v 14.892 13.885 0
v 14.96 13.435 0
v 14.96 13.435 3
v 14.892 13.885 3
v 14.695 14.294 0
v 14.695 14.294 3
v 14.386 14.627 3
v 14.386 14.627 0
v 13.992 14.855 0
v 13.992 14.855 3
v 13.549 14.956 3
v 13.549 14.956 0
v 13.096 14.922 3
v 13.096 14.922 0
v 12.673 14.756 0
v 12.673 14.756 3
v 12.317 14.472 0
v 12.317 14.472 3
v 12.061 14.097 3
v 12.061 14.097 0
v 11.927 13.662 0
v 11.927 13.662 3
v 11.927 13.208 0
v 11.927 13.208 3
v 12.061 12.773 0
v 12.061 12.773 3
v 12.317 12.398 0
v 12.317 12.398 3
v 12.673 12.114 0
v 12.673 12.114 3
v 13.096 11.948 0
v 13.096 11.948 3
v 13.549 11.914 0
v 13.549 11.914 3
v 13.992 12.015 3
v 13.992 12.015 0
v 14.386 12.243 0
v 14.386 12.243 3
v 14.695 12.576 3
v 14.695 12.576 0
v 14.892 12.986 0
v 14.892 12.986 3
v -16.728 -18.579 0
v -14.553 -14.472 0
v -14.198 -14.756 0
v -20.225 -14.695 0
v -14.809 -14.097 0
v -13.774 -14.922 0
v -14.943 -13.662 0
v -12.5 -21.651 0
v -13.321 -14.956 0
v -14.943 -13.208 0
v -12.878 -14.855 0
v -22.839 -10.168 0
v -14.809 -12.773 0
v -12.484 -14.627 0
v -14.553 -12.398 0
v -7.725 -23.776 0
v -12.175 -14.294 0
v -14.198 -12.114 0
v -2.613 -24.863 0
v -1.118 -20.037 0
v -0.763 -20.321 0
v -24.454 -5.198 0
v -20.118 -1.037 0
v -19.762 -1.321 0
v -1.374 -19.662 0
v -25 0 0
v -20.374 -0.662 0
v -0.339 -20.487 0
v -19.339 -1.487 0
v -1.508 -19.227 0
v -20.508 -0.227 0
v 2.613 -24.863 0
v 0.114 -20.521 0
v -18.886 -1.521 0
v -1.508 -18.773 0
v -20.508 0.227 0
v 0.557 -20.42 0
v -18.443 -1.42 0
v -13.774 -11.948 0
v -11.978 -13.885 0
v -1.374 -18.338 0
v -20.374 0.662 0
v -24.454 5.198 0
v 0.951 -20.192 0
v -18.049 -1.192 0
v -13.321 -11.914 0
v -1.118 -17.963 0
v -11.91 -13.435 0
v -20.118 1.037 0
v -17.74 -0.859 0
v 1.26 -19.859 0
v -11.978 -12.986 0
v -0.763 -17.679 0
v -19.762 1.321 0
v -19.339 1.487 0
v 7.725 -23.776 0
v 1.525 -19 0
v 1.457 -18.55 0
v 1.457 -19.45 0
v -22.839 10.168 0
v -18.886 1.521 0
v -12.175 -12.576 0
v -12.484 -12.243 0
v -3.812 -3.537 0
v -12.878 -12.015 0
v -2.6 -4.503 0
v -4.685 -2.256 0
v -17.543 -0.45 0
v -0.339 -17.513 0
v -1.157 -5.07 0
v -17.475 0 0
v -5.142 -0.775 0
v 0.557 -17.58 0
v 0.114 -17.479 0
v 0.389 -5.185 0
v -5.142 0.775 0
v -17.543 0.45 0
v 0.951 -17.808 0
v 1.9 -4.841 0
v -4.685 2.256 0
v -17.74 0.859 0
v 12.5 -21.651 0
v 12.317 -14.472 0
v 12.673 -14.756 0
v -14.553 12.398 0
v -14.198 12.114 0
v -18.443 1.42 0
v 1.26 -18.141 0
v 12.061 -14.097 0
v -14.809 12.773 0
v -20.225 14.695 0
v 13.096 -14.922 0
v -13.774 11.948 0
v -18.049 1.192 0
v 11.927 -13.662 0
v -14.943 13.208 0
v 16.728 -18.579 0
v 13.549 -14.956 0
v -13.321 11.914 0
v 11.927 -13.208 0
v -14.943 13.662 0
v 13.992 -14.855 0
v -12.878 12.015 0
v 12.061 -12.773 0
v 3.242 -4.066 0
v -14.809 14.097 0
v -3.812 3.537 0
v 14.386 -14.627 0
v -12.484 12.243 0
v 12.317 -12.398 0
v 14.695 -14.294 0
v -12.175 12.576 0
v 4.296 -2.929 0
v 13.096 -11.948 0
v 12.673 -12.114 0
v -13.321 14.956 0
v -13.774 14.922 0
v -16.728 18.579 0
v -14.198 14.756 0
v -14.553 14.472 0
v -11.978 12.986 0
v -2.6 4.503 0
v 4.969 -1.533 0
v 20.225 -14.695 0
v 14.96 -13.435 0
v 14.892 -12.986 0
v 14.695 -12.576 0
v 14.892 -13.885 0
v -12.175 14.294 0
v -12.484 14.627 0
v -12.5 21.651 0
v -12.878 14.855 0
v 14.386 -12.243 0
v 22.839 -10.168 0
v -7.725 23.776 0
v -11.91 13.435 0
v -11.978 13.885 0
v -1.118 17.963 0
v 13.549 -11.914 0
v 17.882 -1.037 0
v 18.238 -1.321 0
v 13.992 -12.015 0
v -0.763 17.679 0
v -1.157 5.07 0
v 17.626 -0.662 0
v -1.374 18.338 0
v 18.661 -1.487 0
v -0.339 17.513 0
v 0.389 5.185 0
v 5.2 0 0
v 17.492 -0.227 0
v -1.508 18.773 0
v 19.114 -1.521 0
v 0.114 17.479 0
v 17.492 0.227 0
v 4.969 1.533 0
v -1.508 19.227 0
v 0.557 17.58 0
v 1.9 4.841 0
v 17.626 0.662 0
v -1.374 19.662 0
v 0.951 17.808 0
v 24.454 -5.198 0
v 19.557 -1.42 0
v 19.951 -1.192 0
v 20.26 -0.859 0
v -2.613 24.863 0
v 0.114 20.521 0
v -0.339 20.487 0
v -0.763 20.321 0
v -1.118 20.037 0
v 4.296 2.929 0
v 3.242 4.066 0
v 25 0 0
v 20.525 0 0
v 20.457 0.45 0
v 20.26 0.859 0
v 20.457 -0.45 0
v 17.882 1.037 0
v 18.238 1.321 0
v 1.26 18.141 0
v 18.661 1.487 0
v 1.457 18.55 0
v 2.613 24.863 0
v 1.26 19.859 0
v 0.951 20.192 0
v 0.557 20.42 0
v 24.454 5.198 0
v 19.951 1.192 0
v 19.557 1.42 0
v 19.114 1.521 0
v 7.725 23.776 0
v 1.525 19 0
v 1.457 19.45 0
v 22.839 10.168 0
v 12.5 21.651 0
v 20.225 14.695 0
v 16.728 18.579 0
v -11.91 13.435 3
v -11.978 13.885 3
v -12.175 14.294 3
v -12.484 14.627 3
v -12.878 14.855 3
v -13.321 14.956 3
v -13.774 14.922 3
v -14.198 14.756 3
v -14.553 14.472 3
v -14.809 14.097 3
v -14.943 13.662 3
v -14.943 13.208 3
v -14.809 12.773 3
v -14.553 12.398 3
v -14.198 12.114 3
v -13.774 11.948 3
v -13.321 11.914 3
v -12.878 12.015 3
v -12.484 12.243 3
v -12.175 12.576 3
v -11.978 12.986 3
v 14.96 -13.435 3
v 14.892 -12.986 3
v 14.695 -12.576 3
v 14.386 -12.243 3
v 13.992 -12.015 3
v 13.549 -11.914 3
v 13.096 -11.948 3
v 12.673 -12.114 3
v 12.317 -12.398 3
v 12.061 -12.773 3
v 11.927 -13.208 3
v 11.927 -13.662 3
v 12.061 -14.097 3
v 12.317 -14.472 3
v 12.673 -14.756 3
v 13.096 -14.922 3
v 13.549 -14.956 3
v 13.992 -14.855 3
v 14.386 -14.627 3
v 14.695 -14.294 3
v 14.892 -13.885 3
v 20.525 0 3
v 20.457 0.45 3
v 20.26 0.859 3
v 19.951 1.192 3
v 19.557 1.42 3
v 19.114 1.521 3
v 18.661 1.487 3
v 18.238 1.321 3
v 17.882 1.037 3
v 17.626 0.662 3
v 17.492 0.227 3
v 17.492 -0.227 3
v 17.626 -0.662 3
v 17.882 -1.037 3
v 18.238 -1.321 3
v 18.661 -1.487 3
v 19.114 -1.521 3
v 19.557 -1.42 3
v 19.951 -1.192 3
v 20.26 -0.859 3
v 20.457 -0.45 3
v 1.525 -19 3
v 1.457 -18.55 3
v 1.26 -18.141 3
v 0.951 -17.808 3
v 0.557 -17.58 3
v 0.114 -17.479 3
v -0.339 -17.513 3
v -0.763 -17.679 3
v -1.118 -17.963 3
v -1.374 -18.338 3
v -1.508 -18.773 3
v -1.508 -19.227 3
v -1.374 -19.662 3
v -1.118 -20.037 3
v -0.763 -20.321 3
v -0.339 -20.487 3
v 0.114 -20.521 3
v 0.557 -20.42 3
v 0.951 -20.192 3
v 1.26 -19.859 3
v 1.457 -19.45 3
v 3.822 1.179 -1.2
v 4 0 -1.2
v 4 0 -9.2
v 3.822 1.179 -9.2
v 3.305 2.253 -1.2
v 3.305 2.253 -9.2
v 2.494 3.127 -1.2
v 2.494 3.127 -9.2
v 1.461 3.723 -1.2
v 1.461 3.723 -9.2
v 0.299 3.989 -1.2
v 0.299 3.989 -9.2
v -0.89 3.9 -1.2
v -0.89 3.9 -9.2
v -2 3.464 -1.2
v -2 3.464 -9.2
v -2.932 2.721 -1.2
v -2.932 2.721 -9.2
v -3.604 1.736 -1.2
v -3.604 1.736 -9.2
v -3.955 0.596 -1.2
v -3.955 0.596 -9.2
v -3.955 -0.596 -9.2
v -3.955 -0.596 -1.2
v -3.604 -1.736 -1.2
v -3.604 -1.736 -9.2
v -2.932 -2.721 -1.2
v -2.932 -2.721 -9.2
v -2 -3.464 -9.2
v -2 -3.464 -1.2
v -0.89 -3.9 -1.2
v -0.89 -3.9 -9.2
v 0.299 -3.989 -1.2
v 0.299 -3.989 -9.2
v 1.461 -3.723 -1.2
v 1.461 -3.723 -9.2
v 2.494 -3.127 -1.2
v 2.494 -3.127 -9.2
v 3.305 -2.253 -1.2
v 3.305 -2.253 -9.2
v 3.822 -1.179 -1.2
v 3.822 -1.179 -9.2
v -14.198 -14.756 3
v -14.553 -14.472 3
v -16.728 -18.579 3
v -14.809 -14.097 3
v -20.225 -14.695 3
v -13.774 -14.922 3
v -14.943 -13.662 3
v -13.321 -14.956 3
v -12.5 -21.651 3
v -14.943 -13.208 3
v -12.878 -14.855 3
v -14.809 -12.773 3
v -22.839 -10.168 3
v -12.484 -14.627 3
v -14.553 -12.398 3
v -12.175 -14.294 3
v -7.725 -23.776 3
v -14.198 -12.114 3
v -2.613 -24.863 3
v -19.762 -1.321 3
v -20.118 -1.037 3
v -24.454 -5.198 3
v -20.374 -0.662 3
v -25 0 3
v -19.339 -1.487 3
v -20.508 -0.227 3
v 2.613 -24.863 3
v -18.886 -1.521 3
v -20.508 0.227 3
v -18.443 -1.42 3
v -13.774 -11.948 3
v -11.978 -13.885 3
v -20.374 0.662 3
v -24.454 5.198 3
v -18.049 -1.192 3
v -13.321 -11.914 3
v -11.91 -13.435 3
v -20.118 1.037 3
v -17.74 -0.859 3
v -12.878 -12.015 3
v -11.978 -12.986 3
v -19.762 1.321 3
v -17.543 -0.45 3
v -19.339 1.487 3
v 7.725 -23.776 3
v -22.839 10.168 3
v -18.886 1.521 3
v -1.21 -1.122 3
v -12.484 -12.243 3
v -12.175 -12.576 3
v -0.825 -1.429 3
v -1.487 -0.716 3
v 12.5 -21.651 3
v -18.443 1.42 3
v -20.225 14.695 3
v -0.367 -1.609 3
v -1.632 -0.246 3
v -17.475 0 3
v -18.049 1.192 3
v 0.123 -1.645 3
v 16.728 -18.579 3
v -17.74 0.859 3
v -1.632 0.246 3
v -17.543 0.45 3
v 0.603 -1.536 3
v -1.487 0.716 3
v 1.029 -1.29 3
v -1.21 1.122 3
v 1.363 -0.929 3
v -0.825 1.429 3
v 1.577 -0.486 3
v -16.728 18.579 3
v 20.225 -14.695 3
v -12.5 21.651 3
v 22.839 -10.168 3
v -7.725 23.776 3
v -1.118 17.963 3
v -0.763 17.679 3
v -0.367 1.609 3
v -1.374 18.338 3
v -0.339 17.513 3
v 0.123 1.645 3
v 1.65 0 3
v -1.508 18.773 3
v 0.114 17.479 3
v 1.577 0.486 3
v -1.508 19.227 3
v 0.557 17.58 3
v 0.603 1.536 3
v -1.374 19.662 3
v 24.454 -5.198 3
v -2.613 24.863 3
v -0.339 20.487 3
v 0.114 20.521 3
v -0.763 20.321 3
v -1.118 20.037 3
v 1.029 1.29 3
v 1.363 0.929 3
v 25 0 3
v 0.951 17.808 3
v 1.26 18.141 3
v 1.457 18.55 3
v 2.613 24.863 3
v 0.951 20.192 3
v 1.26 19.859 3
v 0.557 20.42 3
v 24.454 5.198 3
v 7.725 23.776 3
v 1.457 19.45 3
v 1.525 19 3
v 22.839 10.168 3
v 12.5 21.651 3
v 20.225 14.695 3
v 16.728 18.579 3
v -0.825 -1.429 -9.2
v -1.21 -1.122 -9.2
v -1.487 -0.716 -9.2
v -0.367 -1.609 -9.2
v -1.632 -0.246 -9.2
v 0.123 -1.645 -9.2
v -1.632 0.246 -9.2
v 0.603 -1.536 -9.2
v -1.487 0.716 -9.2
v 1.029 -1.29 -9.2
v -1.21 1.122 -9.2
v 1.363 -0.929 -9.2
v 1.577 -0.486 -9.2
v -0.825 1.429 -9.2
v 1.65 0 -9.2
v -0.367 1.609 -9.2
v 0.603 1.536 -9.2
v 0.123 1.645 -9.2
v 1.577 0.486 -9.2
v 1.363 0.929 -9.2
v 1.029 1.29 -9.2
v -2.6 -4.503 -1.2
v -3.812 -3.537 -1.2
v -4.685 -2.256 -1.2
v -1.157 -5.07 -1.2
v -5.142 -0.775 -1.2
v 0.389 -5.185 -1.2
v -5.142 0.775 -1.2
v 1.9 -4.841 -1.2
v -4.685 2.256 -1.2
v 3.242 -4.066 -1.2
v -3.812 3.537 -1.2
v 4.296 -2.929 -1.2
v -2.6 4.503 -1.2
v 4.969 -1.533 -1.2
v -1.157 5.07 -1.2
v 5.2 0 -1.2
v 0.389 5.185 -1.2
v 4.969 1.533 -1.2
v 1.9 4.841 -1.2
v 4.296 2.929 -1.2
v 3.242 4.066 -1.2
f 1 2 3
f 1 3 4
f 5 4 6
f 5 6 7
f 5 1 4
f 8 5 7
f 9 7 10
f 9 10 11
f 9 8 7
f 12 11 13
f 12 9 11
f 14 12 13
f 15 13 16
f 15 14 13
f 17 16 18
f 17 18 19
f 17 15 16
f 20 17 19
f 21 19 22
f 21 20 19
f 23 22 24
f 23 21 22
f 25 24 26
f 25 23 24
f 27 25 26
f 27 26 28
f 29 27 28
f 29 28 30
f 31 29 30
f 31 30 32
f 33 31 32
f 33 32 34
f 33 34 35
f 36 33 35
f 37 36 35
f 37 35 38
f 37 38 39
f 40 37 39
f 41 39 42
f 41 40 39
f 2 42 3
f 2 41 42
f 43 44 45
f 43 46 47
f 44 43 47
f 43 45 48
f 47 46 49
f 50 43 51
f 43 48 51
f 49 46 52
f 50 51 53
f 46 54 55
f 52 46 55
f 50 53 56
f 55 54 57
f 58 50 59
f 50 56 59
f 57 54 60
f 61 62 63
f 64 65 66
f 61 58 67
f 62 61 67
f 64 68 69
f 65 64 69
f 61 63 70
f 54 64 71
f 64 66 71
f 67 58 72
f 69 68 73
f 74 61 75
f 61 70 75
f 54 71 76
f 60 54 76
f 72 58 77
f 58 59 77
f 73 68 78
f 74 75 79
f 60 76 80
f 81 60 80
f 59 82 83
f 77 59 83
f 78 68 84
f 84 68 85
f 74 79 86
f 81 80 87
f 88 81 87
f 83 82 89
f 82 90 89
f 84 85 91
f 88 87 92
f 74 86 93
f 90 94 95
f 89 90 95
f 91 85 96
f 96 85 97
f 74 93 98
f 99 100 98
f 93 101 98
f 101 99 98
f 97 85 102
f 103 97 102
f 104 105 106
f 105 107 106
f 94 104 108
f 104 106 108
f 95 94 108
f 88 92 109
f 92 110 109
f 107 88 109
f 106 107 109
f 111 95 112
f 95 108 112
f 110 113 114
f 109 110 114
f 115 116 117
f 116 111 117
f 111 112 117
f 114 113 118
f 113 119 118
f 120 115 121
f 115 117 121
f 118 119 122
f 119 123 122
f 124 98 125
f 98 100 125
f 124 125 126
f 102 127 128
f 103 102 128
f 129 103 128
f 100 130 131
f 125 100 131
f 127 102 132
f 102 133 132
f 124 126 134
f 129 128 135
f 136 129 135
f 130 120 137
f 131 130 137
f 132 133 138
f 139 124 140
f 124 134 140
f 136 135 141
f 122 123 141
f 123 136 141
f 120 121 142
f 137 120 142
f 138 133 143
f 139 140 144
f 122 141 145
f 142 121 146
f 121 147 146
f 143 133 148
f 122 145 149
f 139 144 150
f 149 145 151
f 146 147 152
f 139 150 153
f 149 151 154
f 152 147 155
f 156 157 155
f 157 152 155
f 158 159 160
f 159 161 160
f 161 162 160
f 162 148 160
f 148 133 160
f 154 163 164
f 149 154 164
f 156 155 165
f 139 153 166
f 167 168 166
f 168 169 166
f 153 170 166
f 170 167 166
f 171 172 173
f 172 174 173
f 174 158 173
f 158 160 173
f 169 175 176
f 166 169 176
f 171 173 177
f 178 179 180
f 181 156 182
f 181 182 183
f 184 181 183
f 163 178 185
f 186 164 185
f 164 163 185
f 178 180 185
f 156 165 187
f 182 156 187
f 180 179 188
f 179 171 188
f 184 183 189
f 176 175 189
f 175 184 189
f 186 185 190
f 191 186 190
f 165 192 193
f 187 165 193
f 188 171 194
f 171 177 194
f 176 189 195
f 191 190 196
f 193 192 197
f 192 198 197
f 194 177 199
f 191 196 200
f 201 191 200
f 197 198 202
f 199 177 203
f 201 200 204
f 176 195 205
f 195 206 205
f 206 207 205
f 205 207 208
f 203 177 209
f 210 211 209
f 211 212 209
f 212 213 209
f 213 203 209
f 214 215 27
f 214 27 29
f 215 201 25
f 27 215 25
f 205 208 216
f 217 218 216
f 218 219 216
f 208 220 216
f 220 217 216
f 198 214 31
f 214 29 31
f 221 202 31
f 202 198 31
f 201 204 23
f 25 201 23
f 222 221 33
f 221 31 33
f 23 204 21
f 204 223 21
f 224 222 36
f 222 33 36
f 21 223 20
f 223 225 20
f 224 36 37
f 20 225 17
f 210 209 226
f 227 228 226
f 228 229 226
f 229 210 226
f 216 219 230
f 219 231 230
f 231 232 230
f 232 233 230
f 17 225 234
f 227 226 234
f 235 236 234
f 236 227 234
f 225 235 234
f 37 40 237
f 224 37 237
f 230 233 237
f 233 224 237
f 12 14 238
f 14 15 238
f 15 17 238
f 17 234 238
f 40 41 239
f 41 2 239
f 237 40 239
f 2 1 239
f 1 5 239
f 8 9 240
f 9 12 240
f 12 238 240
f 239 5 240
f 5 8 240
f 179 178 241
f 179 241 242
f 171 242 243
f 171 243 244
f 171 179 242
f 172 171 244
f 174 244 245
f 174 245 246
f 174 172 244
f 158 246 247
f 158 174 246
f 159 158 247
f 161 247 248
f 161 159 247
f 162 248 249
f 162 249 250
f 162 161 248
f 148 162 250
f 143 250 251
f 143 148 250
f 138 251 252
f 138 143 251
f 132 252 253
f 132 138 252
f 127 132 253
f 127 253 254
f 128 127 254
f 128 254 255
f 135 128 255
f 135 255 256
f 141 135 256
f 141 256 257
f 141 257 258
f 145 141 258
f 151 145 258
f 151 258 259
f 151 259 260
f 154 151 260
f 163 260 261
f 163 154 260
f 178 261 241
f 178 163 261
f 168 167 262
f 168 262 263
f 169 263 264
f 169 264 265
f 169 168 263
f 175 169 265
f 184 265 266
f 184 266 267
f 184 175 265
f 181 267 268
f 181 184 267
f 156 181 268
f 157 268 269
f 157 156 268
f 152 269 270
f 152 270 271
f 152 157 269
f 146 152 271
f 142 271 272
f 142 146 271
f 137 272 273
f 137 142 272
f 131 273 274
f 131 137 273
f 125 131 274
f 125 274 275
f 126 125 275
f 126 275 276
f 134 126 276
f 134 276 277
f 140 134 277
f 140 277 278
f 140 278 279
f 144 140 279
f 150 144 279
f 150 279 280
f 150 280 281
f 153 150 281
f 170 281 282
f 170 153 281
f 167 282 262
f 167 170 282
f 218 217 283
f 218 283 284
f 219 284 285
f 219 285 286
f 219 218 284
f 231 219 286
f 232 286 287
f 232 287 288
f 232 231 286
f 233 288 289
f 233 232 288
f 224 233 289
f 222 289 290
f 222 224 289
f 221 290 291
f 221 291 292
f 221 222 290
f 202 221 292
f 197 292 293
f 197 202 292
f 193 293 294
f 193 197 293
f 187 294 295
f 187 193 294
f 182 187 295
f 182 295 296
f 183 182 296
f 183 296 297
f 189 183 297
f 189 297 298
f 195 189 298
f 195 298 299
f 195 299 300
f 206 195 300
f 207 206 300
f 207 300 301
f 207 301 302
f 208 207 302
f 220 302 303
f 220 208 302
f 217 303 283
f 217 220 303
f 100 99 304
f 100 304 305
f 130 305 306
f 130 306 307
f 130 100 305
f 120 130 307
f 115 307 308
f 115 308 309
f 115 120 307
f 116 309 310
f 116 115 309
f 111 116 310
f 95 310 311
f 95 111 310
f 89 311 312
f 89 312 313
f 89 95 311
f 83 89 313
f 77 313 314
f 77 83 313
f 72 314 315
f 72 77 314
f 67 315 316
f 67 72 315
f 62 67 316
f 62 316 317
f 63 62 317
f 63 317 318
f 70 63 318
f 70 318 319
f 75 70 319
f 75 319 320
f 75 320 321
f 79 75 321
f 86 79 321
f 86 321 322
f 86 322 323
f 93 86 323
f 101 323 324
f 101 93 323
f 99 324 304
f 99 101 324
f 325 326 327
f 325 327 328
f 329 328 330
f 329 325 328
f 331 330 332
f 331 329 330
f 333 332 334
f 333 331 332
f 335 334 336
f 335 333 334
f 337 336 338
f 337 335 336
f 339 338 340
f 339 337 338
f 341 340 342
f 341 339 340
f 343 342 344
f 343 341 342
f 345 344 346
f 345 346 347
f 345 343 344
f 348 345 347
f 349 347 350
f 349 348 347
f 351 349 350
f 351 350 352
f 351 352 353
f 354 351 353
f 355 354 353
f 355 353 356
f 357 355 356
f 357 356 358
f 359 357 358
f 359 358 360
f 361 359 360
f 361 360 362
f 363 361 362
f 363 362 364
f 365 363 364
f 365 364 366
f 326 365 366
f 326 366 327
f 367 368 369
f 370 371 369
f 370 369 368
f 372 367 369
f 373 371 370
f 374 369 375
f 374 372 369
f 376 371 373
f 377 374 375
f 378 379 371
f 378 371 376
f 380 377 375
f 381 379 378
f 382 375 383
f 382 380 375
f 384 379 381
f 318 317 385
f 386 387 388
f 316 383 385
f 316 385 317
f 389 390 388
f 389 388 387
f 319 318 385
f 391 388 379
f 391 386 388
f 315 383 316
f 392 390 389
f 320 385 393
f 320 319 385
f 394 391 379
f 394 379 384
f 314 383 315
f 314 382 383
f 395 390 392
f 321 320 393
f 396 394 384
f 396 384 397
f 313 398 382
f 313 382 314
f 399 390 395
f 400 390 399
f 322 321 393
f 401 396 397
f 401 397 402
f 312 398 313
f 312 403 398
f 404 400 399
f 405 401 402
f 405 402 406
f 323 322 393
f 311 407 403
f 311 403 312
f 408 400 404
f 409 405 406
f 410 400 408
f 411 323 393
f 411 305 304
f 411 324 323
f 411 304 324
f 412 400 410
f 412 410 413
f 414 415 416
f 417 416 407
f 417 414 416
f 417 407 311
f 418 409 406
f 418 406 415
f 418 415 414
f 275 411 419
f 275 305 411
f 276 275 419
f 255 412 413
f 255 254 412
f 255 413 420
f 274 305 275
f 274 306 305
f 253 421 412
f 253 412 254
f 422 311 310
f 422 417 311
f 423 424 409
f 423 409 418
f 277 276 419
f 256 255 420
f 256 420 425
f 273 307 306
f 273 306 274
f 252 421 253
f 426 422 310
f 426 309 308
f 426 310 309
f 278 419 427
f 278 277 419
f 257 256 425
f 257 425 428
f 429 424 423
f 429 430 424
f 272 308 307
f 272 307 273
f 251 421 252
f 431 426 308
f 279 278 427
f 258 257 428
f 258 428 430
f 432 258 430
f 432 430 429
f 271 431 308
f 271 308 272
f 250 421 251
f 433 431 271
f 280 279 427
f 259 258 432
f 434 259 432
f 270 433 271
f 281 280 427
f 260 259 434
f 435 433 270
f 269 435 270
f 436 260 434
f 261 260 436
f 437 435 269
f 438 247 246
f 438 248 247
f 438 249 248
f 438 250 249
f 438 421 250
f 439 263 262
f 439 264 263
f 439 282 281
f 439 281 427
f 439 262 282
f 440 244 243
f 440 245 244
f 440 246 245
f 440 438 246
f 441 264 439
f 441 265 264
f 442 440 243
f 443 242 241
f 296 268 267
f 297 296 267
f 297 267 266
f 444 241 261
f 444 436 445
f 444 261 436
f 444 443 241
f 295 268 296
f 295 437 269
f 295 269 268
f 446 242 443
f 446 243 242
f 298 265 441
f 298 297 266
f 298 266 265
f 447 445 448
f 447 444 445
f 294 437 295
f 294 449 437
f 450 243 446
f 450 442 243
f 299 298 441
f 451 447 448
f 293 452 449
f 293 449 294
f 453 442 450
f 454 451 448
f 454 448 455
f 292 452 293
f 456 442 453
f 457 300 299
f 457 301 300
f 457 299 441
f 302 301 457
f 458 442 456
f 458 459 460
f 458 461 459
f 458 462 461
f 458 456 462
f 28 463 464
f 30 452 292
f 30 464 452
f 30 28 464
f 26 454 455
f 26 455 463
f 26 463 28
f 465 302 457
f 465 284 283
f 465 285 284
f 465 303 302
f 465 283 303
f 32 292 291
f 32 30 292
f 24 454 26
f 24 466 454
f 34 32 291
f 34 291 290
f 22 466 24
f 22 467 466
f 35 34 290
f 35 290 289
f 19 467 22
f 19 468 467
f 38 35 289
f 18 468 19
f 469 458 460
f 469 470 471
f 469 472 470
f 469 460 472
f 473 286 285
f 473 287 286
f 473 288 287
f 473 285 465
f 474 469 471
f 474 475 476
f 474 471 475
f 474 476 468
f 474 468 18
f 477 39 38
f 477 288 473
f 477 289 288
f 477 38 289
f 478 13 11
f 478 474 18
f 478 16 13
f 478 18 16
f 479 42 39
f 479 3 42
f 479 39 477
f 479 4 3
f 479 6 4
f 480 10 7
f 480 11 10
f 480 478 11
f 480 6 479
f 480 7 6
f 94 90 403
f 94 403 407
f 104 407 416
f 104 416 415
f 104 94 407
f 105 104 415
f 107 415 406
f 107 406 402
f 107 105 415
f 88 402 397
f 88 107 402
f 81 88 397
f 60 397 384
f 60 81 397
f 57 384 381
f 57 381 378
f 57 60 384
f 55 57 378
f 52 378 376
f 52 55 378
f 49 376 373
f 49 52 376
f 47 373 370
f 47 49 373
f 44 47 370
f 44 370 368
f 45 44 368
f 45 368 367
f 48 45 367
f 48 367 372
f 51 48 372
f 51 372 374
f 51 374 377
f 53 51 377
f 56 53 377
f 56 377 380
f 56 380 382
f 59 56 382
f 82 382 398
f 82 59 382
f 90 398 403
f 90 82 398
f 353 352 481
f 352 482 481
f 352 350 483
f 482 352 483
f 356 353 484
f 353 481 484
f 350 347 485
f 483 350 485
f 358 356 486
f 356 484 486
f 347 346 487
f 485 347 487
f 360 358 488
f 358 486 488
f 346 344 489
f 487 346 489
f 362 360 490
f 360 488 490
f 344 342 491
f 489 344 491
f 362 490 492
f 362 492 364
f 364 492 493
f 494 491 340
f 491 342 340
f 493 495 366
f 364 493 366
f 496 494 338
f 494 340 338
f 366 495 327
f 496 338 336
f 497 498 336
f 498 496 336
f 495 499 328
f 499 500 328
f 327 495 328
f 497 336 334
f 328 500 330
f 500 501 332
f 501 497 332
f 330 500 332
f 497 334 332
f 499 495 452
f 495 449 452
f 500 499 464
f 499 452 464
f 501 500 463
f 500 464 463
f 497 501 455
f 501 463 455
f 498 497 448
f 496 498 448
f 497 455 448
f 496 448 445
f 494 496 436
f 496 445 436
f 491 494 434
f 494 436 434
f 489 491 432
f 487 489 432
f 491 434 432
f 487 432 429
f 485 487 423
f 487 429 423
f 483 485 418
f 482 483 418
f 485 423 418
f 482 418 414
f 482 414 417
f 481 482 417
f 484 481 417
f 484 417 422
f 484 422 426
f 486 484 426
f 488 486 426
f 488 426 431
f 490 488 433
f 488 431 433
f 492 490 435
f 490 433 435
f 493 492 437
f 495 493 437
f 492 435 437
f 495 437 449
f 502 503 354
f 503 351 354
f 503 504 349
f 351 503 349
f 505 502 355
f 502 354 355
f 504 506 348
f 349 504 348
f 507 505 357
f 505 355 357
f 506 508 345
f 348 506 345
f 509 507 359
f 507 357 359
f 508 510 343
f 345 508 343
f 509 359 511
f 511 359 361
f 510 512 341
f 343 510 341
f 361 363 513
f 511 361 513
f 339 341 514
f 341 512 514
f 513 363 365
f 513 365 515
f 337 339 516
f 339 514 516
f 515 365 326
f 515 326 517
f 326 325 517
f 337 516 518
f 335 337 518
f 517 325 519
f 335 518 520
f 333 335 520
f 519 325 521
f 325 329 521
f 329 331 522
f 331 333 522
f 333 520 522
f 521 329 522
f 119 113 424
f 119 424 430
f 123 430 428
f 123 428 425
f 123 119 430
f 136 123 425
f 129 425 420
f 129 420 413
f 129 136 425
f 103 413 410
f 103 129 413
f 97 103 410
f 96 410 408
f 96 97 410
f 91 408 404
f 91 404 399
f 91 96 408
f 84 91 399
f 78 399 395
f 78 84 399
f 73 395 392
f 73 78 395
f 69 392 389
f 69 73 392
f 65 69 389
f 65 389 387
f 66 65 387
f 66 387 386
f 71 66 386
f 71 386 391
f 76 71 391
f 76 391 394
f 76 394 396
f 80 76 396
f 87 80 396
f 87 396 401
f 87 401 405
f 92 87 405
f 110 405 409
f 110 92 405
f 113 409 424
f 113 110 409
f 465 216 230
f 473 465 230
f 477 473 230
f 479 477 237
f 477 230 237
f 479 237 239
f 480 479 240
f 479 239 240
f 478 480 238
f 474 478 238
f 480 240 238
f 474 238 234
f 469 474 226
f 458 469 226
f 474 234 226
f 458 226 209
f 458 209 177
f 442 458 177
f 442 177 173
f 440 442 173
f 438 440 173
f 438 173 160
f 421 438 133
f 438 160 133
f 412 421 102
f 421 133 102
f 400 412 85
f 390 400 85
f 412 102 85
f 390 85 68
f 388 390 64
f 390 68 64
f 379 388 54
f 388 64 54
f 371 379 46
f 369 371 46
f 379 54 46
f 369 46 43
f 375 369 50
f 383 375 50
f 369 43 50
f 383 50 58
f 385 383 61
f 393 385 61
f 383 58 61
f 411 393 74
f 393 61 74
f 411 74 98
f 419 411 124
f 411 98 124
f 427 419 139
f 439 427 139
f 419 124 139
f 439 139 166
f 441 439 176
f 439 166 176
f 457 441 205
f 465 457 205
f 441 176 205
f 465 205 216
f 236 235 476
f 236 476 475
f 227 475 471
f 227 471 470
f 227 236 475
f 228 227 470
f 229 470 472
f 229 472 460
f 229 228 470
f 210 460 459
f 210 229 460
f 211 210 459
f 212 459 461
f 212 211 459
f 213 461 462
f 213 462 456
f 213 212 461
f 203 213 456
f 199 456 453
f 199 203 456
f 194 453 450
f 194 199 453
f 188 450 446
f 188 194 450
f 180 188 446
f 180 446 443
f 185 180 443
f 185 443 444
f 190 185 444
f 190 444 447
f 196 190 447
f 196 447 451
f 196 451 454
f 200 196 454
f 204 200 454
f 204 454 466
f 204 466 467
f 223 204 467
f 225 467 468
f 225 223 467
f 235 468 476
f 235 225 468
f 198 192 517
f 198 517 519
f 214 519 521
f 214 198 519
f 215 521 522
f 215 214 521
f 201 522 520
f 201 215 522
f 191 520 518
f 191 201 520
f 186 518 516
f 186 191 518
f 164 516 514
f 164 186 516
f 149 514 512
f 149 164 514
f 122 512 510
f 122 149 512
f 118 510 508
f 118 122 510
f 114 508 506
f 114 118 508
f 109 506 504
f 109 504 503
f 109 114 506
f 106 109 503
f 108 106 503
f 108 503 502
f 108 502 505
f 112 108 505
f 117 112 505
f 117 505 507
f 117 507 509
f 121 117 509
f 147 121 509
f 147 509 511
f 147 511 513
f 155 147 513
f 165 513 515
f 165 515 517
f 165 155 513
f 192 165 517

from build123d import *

# Parameters (mm, degrees)
SKETCH_1_R               = 25
SKETCH_1_R_2             = 1.525
EXTRUDE_1_DEPTH          = 3
EXTRUDE_START            = -3
SKETCH_2_R               = 4
EXTRUDE_2_DEPTH          = 11.3
SKETCH_3_R               = 5.2
EXTRUDE_3_DEPTH          = 1.2
HOLE_WIZARD_M4_1_D       = 3.3
SKETCH_6_W               = 9
SKETCH_6_H               = 2.1
CUT_EXTRUDE_1_DEPTH      = 26
CUT_EXTRUDE_1_DEPTH_BACK = 26


with BuildPart() as part:
    # 草图1 → 凸台-拉伸1 (new body)
    with BuildSketch(Plane.XY):
        Circle(SKETCH_1_R)
        with Locations((0, 19)):
            Circle(SKETCH_1_R_2, mode=Mode.SUBTRACT)
        with Locations((13.435028843, 13.435028843)):
            Circle(SKETCH_1_R_2, mode=Mode.SUBTRACT)
        with Locations((19, 0)):
            Circle(SKETCH_1_R_2, mode=Mode.SUBTRACT)
        with Locations((13.435028843, -13.435028843)):
            Circle(SKETCH_1_R_2, mode=Mode.SUBTRACT)
        with Locations((0, -19)):
            Circle(SKETCH_1_R_2, mode=Mode.SUBTRACT)
        with Locations((-13.435028843, -13.435028843)):
            Circle(SKETCH_1_R_2, mode=Mode.SUBTRACT)
        with Locations((-19, 0)):
            Circle(SKETCH_1_R_2, mode=Mode.SUBTRACT)
        with Locations((-13.435028843, 13.435028843)):
            Circle(SKETCH_1_R_2, mode=Mode.SUBTRACT)
    extrude(amount=EXTRUDE_1_DEPTH)

    # 草图2 → 凸台-拉伸2 (add)
    with BuildSketch(Plane.XY.offset(3).offset(EXTRUDE_START)):
        Circle(SKETCH_2_R)
    extrude(amount=-EXTRUDE_2_DEPTH)

    # 草图3 → 凸台-拉伸3 (add)
    with BuildSketch(Plane.XY.offset(3).offset(EXTRUDE_START)):
        Circle(SKETCH_3_R)
    extrude(amount=-EXTRUDE_3_DEPTH)

    # M4 螺纹孔1 (through all)
    with Locations(Plane(origin=(0, 0, -11.3), x_dir=(-1, 0, 0), z_dir=(0, 0, -1))):
        with Locations((0, 0)):
            Hole(HOLE_WIZARD_M4_1_D / 2)

    # 草图6 → 切除-拉伸1 (cut, two sides)
    with BuildSketch(Plane(origin=(0, 0, 0), x_dir=(1, 0, 0), z_dir=(0, 1, 0))) as cut_extrude_1_sk:
        with Locations((-0.5, 10.25)):
            Rectangle(SKETCH_6_W, SKETCH_6_H)
    extrude(amount=CUT_EXTRUDE_1_DEPTH, mode=Mode.SUBTRACT)
    extrude(cut_extrude_1_sk.sketch, amount=-CUT_EXTRUDE_1_DEPTH_BACK, mode=Mode.SUBTRACT)


solid = part.part
